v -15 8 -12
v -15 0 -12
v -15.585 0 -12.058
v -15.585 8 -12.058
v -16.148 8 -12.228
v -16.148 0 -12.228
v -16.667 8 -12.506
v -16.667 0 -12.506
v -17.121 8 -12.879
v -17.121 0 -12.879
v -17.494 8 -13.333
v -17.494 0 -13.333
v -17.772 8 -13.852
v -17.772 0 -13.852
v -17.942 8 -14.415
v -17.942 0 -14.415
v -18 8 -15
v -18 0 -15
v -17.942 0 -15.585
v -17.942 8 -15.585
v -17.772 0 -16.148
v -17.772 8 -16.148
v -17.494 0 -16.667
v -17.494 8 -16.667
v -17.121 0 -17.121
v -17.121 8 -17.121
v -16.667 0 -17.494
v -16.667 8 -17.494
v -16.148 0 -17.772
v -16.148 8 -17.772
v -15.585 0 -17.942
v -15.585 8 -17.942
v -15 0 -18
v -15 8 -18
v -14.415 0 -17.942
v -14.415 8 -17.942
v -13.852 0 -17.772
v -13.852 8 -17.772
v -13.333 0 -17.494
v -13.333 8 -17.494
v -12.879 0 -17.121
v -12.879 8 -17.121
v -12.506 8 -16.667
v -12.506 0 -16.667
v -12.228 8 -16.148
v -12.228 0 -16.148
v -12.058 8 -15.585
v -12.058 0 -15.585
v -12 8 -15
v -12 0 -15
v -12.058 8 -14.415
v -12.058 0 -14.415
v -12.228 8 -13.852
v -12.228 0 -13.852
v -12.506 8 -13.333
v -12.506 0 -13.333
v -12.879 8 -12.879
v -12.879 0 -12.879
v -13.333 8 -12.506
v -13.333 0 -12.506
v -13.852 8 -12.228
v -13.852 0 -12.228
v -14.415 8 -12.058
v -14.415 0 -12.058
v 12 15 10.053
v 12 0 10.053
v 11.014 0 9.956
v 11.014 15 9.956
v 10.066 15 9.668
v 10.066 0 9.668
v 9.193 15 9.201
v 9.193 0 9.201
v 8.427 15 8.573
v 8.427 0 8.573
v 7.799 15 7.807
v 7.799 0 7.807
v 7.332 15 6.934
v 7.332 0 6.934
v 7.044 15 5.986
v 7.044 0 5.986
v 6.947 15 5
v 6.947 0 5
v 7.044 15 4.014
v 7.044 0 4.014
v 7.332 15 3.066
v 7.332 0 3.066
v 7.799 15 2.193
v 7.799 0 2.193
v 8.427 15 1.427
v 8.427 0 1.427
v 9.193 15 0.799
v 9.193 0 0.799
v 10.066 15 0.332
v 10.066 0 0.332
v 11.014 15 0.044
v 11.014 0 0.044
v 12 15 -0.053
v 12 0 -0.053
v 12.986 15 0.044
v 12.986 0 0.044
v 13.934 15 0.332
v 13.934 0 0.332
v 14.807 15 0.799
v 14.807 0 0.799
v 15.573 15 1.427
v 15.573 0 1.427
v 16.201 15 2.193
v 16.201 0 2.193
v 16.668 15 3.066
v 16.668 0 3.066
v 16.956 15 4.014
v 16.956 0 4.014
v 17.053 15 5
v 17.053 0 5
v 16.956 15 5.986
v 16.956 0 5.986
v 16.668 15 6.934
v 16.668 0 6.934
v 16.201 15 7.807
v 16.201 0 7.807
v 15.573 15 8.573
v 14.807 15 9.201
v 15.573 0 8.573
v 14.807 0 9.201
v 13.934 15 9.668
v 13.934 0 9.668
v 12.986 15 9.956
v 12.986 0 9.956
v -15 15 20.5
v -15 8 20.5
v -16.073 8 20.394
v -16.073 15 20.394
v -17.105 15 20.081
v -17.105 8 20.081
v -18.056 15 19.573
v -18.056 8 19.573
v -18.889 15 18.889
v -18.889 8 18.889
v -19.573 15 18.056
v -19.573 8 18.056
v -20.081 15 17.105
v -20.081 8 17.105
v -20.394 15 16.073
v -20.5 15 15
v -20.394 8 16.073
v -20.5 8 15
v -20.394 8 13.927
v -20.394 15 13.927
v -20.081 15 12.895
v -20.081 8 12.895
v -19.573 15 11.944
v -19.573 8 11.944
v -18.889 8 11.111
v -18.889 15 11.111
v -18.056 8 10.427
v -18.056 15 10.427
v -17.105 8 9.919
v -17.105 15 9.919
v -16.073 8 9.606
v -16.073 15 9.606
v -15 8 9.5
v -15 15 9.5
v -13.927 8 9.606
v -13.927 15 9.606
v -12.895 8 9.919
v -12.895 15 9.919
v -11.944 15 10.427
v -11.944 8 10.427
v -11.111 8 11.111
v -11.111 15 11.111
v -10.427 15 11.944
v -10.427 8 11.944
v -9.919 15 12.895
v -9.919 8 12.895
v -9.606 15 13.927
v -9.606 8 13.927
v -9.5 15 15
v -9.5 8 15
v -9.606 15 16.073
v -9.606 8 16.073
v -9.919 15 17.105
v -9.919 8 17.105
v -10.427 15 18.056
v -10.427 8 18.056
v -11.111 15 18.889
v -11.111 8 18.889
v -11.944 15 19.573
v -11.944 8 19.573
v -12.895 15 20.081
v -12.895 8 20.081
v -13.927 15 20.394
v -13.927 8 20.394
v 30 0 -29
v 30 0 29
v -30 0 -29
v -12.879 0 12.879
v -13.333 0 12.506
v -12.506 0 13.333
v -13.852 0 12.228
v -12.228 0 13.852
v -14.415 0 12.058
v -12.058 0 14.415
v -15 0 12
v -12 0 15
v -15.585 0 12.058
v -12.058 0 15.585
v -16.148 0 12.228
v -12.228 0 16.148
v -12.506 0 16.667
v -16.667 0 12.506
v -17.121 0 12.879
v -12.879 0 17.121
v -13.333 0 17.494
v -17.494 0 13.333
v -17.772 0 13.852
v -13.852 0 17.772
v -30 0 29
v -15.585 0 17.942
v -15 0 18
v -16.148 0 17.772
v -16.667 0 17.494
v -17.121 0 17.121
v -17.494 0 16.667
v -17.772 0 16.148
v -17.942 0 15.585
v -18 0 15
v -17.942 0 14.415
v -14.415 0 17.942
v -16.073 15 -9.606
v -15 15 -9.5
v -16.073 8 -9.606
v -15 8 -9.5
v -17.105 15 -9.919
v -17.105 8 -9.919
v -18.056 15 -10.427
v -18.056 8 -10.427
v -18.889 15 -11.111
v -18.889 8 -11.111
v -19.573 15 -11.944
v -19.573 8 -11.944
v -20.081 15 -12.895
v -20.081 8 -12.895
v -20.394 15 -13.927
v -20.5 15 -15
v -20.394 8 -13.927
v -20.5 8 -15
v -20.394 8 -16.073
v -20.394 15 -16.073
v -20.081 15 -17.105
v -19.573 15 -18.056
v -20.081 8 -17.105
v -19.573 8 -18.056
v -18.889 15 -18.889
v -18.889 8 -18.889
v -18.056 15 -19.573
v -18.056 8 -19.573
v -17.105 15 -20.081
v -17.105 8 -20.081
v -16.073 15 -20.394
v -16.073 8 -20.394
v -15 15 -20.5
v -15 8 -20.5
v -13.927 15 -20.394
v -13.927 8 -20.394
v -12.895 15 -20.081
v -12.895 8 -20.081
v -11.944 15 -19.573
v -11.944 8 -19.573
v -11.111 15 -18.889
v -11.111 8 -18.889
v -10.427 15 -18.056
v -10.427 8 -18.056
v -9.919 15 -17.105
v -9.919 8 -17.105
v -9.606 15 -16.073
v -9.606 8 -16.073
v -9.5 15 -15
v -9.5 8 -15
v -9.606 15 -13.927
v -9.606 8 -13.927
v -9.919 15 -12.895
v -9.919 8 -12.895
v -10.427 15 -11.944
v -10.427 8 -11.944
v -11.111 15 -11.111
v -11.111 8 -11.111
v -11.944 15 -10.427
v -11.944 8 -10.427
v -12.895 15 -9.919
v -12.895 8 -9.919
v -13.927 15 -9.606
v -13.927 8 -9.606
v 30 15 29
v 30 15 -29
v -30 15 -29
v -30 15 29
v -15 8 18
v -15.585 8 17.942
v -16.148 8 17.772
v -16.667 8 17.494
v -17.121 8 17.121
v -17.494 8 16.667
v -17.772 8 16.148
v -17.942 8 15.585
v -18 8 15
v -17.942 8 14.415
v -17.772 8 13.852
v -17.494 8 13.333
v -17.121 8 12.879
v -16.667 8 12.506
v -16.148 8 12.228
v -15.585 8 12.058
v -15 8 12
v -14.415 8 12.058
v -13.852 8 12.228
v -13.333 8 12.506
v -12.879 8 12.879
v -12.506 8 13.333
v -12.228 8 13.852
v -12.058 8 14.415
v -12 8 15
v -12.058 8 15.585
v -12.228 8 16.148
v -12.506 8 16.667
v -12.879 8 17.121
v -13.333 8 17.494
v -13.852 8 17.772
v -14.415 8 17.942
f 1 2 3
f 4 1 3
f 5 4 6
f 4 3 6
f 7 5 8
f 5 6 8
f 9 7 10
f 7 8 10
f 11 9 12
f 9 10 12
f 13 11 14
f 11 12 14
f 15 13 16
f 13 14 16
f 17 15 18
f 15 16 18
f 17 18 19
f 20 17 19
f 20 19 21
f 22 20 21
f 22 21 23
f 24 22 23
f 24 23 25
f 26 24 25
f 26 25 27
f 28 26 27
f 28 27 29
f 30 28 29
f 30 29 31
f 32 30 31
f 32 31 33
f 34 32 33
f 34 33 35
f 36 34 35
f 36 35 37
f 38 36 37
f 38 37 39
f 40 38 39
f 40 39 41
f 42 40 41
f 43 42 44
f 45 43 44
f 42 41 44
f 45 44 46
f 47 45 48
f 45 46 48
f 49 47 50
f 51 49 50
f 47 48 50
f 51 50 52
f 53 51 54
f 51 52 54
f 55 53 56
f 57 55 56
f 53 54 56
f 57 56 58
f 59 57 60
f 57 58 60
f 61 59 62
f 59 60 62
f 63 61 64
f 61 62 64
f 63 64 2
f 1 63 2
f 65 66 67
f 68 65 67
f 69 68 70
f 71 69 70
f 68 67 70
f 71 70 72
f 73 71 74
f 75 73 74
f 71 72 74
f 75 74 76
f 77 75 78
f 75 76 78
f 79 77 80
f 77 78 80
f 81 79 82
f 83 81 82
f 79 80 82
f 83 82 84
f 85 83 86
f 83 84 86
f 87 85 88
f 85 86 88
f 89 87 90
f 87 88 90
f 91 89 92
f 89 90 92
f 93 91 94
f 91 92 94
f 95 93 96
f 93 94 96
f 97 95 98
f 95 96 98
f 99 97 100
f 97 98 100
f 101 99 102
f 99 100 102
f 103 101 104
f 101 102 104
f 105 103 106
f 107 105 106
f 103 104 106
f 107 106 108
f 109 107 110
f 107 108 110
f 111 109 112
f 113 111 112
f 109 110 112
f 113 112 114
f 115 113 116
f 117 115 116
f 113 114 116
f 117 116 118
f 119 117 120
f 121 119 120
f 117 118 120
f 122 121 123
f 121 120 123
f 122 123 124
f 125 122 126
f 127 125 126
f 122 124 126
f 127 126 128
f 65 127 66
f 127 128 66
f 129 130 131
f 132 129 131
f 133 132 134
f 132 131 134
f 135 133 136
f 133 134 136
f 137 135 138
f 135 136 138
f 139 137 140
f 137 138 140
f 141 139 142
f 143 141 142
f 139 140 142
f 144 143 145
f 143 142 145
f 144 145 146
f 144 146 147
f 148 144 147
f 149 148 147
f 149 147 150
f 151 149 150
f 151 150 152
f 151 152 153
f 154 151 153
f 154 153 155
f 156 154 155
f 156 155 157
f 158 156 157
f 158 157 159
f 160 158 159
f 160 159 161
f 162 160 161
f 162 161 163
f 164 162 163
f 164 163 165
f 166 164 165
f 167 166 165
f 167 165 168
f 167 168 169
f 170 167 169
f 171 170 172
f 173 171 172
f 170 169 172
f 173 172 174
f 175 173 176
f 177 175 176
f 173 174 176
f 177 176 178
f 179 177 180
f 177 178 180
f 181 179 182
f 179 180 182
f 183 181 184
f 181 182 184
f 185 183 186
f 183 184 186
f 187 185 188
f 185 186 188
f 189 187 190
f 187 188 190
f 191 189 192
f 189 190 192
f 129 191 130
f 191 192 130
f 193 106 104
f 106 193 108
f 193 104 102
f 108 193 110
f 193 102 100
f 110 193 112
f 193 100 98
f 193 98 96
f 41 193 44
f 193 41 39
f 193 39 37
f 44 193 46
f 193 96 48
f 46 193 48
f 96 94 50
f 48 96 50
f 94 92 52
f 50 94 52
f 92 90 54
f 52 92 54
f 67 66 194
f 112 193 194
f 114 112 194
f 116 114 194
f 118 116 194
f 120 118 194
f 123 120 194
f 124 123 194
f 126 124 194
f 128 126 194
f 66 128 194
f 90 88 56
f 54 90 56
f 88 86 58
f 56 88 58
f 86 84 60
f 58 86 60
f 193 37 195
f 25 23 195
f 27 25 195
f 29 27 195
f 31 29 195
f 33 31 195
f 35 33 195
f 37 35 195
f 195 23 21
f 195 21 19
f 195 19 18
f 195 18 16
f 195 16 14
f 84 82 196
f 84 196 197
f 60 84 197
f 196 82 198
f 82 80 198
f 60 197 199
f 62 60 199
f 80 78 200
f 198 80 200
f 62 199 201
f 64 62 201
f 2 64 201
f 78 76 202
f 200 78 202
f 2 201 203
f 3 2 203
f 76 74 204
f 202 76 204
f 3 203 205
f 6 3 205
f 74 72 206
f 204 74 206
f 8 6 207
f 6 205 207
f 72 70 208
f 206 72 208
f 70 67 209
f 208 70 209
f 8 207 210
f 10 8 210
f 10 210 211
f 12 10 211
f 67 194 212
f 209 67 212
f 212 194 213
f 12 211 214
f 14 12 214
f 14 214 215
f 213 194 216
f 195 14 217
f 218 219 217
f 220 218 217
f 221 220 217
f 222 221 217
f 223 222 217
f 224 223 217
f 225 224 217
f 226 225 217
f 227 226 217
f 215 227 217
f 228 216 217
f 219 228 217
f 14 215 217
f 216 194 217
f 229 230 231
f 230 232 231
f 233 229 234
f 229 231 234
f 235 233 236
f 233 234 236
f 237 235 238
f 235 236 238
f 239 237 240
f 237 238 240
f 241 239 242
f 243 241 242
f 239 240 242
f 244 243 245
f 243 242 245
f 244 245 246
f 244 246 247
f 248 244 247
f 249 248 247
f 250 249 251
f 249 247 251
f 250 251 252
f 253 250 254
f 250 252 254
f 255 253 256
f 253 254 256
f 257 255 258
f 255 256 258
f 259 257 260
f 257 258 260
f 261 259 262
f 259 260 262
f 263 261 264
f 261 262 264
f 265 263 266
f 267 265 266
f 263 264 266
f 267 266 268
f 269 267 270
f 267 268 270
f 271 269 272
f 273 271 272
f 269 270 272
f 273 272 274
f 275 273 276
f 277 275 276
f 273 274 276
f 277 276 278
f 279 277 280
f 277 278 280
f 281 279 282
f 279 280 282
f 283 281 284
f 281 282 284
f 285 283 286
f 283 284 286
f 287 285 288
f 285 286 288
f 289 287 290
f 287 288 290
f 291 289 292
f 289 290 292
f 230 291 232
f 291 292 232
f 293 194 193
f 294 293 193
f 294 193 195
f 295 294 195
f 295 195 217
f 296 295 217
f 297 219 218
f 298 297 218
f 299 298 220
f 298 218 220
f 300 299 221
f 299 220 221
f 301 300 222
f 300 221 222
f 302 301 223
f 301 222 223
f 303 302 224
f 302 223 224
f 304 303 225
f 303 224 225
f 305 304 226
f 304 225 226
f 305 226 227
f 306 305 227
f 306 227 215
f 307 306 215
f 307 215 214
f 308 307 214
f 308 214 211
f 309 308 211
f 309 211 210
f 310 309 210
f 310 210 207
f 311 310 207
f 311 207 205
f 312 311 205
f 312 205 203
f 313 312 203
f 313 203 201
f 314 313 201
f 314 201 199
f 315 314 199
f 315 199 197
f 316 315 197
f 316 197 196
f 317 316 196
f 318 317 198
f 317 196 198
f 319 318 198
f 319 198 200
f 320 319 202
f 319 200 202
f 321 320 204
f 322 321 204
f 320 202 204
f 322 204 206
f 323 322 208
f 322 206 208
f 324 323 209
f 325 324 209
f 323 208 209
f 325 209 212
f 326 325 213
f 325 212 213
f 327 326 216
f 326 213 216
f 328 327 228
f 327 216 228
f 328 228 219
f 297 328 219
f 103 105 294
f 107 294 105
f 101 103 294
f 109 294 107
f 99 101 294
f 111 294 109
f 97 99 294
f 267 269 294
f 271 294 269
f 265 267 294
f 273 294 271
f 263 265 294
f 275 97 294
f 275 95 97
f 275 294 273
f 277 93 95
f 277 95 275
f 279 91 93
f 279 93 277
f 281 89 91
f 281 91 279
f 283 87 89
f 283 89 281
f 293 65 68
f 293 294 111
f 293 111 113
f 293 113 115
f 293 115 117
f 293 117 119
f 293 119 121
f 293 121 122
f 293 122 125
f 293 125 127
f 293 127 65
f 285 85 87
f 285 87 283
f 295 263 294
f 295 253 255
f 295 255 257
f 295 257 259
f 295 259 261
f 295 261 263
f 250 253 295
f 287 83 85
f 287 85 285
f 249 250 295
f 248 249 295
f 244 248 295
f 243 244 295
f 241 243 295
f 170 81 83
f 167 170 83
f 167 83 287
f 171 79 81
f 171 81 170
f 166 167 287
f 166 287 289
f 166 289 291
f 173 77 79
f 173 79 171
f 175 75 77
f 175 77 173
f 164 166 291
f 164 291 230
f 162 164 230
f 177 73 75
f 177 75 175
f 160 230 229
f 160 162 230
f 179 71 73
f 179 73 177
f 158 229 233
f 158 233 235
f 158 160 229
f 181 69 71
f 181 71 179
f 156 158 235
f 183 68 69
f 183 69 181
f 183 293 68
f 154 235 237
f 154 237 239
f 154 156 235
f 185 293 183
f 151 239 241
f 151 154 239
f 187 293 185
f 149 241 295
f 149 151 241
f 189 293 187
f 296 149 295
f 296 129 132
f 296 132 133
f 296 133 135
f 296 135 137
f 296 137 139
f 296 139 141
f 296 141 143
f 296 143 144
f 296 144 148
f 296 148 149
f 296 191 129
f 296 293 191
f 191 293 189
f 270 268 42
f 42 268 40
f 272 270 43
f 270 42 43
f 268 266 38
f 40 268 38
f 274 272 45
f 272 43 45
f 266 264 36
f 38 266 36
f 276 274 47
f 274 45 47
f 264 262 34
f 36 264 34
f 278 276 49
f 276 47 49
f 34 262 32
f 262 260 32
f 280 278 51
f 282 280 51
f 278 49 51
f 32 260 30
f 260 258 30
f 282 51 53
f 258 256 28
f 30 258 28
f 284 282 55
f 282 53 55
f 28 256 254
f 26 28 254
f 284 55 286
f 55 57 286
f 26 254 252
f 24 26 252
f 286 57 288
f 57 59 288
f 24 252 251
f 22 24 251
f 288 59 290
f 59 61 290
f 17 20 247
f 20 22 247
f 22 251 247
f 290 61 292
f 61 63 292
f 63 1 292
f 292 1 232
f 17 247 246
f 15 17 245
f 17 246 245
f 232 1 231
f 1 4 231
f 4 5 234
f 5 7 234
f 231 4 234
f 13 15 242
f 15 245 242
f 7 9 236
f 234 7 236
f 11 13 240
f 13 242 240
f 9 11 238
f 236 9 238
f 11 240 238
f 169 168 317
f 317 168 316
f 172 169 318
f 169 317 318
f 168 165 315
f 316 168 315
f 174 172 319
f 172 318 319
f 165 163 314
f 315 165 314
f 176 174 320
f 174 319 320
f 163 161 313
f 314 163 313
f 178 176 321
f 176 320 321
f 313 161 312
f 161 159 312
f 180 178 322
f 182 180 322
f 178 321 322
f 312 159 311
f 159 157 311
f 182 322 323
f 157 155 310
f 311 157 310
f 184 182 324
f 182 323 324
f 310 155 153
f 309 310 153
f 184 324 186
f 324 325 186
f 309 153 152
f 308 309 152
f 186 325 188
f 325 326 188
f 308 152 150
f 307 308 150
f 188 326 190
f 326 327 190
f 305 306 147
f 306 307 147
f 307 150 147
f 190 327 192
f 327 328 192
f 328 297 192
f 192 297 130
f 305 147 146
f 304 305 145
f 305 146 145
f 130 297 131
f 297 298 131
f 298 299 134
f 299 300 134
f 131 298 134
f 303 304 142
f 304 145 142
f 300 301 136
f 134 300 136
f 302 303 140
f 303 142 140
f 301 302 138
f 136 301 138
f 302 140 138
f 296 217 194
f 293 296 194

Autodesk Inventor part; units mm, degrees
ref_plane "YZ Plane" through (0, 0, 0) normal (1, 0, 0) x (0, 1, 0)
ref_plane "XZ Plane" through (0, 0, 0) normal (0, 1, 0) x (-1, 0, 0)
ref_plane "XY Plane" through (0, 0, 0) normal (0, 0, 1) x (1, 0, 0)
sketch "Sketch1" plane through (0, 0, 0) normal (0, 1, 0) x (-1, 0, 0)
  line L0 (30, 29) -> (-30, 29)
  line L1 (-30, 29) -> (-30, -29)
  line L2 (-30, -29) -> (30, -29)
  line L3 (30, -29) -> (30, 29)
  line L4 (30, 29) -> (-30, -29) construction
  line L5 (-30, 29) -> (30, -29) construction
  point P0 (0, 0)
  dimension "d0" = 60
  dimension "d1" = 58
extrude "Extrusion1" add sketch "Sketch1" along normal blind 15
sketch "Sketch2" plane through (0, 15, 0) normal (0, 1, 0) x (1, 0, 0)
  line L0 (30, -29) -> (30, 29) projected
  line L1 (30, 29) -> (-30, 29) projected
  line L2 (-30, 29) -> (-30, -29) projected
  line L3 (-30, -29) -> (30, -29) projected
  line L4 (-30, 0) -> (30, 0) construction
  point P0 (0, 0)
  point P1 (-15, -15)
  point P2 (-15, 15)
  point P3 (0, 0)
  point P4 (12, -5)
  dimension "d4" = 30
  dimension "d5" = 15
  dimension "d22" = 12
  dimension "d23" = 5
hole "Hole1" at (12, 15, 5) direction (0, -1, 0) diameter 10.106 end through all thread size "M12x1.75" class "6H" standard "ISO Metric profile"
hole "Hole2" at (-15, 15, 15) at (-15, 15, -15) direction (0, -1, 0) diameter 6 end through all counterbore diameter 11 counterbore depth 7
properties part number "Lift Bracket"
